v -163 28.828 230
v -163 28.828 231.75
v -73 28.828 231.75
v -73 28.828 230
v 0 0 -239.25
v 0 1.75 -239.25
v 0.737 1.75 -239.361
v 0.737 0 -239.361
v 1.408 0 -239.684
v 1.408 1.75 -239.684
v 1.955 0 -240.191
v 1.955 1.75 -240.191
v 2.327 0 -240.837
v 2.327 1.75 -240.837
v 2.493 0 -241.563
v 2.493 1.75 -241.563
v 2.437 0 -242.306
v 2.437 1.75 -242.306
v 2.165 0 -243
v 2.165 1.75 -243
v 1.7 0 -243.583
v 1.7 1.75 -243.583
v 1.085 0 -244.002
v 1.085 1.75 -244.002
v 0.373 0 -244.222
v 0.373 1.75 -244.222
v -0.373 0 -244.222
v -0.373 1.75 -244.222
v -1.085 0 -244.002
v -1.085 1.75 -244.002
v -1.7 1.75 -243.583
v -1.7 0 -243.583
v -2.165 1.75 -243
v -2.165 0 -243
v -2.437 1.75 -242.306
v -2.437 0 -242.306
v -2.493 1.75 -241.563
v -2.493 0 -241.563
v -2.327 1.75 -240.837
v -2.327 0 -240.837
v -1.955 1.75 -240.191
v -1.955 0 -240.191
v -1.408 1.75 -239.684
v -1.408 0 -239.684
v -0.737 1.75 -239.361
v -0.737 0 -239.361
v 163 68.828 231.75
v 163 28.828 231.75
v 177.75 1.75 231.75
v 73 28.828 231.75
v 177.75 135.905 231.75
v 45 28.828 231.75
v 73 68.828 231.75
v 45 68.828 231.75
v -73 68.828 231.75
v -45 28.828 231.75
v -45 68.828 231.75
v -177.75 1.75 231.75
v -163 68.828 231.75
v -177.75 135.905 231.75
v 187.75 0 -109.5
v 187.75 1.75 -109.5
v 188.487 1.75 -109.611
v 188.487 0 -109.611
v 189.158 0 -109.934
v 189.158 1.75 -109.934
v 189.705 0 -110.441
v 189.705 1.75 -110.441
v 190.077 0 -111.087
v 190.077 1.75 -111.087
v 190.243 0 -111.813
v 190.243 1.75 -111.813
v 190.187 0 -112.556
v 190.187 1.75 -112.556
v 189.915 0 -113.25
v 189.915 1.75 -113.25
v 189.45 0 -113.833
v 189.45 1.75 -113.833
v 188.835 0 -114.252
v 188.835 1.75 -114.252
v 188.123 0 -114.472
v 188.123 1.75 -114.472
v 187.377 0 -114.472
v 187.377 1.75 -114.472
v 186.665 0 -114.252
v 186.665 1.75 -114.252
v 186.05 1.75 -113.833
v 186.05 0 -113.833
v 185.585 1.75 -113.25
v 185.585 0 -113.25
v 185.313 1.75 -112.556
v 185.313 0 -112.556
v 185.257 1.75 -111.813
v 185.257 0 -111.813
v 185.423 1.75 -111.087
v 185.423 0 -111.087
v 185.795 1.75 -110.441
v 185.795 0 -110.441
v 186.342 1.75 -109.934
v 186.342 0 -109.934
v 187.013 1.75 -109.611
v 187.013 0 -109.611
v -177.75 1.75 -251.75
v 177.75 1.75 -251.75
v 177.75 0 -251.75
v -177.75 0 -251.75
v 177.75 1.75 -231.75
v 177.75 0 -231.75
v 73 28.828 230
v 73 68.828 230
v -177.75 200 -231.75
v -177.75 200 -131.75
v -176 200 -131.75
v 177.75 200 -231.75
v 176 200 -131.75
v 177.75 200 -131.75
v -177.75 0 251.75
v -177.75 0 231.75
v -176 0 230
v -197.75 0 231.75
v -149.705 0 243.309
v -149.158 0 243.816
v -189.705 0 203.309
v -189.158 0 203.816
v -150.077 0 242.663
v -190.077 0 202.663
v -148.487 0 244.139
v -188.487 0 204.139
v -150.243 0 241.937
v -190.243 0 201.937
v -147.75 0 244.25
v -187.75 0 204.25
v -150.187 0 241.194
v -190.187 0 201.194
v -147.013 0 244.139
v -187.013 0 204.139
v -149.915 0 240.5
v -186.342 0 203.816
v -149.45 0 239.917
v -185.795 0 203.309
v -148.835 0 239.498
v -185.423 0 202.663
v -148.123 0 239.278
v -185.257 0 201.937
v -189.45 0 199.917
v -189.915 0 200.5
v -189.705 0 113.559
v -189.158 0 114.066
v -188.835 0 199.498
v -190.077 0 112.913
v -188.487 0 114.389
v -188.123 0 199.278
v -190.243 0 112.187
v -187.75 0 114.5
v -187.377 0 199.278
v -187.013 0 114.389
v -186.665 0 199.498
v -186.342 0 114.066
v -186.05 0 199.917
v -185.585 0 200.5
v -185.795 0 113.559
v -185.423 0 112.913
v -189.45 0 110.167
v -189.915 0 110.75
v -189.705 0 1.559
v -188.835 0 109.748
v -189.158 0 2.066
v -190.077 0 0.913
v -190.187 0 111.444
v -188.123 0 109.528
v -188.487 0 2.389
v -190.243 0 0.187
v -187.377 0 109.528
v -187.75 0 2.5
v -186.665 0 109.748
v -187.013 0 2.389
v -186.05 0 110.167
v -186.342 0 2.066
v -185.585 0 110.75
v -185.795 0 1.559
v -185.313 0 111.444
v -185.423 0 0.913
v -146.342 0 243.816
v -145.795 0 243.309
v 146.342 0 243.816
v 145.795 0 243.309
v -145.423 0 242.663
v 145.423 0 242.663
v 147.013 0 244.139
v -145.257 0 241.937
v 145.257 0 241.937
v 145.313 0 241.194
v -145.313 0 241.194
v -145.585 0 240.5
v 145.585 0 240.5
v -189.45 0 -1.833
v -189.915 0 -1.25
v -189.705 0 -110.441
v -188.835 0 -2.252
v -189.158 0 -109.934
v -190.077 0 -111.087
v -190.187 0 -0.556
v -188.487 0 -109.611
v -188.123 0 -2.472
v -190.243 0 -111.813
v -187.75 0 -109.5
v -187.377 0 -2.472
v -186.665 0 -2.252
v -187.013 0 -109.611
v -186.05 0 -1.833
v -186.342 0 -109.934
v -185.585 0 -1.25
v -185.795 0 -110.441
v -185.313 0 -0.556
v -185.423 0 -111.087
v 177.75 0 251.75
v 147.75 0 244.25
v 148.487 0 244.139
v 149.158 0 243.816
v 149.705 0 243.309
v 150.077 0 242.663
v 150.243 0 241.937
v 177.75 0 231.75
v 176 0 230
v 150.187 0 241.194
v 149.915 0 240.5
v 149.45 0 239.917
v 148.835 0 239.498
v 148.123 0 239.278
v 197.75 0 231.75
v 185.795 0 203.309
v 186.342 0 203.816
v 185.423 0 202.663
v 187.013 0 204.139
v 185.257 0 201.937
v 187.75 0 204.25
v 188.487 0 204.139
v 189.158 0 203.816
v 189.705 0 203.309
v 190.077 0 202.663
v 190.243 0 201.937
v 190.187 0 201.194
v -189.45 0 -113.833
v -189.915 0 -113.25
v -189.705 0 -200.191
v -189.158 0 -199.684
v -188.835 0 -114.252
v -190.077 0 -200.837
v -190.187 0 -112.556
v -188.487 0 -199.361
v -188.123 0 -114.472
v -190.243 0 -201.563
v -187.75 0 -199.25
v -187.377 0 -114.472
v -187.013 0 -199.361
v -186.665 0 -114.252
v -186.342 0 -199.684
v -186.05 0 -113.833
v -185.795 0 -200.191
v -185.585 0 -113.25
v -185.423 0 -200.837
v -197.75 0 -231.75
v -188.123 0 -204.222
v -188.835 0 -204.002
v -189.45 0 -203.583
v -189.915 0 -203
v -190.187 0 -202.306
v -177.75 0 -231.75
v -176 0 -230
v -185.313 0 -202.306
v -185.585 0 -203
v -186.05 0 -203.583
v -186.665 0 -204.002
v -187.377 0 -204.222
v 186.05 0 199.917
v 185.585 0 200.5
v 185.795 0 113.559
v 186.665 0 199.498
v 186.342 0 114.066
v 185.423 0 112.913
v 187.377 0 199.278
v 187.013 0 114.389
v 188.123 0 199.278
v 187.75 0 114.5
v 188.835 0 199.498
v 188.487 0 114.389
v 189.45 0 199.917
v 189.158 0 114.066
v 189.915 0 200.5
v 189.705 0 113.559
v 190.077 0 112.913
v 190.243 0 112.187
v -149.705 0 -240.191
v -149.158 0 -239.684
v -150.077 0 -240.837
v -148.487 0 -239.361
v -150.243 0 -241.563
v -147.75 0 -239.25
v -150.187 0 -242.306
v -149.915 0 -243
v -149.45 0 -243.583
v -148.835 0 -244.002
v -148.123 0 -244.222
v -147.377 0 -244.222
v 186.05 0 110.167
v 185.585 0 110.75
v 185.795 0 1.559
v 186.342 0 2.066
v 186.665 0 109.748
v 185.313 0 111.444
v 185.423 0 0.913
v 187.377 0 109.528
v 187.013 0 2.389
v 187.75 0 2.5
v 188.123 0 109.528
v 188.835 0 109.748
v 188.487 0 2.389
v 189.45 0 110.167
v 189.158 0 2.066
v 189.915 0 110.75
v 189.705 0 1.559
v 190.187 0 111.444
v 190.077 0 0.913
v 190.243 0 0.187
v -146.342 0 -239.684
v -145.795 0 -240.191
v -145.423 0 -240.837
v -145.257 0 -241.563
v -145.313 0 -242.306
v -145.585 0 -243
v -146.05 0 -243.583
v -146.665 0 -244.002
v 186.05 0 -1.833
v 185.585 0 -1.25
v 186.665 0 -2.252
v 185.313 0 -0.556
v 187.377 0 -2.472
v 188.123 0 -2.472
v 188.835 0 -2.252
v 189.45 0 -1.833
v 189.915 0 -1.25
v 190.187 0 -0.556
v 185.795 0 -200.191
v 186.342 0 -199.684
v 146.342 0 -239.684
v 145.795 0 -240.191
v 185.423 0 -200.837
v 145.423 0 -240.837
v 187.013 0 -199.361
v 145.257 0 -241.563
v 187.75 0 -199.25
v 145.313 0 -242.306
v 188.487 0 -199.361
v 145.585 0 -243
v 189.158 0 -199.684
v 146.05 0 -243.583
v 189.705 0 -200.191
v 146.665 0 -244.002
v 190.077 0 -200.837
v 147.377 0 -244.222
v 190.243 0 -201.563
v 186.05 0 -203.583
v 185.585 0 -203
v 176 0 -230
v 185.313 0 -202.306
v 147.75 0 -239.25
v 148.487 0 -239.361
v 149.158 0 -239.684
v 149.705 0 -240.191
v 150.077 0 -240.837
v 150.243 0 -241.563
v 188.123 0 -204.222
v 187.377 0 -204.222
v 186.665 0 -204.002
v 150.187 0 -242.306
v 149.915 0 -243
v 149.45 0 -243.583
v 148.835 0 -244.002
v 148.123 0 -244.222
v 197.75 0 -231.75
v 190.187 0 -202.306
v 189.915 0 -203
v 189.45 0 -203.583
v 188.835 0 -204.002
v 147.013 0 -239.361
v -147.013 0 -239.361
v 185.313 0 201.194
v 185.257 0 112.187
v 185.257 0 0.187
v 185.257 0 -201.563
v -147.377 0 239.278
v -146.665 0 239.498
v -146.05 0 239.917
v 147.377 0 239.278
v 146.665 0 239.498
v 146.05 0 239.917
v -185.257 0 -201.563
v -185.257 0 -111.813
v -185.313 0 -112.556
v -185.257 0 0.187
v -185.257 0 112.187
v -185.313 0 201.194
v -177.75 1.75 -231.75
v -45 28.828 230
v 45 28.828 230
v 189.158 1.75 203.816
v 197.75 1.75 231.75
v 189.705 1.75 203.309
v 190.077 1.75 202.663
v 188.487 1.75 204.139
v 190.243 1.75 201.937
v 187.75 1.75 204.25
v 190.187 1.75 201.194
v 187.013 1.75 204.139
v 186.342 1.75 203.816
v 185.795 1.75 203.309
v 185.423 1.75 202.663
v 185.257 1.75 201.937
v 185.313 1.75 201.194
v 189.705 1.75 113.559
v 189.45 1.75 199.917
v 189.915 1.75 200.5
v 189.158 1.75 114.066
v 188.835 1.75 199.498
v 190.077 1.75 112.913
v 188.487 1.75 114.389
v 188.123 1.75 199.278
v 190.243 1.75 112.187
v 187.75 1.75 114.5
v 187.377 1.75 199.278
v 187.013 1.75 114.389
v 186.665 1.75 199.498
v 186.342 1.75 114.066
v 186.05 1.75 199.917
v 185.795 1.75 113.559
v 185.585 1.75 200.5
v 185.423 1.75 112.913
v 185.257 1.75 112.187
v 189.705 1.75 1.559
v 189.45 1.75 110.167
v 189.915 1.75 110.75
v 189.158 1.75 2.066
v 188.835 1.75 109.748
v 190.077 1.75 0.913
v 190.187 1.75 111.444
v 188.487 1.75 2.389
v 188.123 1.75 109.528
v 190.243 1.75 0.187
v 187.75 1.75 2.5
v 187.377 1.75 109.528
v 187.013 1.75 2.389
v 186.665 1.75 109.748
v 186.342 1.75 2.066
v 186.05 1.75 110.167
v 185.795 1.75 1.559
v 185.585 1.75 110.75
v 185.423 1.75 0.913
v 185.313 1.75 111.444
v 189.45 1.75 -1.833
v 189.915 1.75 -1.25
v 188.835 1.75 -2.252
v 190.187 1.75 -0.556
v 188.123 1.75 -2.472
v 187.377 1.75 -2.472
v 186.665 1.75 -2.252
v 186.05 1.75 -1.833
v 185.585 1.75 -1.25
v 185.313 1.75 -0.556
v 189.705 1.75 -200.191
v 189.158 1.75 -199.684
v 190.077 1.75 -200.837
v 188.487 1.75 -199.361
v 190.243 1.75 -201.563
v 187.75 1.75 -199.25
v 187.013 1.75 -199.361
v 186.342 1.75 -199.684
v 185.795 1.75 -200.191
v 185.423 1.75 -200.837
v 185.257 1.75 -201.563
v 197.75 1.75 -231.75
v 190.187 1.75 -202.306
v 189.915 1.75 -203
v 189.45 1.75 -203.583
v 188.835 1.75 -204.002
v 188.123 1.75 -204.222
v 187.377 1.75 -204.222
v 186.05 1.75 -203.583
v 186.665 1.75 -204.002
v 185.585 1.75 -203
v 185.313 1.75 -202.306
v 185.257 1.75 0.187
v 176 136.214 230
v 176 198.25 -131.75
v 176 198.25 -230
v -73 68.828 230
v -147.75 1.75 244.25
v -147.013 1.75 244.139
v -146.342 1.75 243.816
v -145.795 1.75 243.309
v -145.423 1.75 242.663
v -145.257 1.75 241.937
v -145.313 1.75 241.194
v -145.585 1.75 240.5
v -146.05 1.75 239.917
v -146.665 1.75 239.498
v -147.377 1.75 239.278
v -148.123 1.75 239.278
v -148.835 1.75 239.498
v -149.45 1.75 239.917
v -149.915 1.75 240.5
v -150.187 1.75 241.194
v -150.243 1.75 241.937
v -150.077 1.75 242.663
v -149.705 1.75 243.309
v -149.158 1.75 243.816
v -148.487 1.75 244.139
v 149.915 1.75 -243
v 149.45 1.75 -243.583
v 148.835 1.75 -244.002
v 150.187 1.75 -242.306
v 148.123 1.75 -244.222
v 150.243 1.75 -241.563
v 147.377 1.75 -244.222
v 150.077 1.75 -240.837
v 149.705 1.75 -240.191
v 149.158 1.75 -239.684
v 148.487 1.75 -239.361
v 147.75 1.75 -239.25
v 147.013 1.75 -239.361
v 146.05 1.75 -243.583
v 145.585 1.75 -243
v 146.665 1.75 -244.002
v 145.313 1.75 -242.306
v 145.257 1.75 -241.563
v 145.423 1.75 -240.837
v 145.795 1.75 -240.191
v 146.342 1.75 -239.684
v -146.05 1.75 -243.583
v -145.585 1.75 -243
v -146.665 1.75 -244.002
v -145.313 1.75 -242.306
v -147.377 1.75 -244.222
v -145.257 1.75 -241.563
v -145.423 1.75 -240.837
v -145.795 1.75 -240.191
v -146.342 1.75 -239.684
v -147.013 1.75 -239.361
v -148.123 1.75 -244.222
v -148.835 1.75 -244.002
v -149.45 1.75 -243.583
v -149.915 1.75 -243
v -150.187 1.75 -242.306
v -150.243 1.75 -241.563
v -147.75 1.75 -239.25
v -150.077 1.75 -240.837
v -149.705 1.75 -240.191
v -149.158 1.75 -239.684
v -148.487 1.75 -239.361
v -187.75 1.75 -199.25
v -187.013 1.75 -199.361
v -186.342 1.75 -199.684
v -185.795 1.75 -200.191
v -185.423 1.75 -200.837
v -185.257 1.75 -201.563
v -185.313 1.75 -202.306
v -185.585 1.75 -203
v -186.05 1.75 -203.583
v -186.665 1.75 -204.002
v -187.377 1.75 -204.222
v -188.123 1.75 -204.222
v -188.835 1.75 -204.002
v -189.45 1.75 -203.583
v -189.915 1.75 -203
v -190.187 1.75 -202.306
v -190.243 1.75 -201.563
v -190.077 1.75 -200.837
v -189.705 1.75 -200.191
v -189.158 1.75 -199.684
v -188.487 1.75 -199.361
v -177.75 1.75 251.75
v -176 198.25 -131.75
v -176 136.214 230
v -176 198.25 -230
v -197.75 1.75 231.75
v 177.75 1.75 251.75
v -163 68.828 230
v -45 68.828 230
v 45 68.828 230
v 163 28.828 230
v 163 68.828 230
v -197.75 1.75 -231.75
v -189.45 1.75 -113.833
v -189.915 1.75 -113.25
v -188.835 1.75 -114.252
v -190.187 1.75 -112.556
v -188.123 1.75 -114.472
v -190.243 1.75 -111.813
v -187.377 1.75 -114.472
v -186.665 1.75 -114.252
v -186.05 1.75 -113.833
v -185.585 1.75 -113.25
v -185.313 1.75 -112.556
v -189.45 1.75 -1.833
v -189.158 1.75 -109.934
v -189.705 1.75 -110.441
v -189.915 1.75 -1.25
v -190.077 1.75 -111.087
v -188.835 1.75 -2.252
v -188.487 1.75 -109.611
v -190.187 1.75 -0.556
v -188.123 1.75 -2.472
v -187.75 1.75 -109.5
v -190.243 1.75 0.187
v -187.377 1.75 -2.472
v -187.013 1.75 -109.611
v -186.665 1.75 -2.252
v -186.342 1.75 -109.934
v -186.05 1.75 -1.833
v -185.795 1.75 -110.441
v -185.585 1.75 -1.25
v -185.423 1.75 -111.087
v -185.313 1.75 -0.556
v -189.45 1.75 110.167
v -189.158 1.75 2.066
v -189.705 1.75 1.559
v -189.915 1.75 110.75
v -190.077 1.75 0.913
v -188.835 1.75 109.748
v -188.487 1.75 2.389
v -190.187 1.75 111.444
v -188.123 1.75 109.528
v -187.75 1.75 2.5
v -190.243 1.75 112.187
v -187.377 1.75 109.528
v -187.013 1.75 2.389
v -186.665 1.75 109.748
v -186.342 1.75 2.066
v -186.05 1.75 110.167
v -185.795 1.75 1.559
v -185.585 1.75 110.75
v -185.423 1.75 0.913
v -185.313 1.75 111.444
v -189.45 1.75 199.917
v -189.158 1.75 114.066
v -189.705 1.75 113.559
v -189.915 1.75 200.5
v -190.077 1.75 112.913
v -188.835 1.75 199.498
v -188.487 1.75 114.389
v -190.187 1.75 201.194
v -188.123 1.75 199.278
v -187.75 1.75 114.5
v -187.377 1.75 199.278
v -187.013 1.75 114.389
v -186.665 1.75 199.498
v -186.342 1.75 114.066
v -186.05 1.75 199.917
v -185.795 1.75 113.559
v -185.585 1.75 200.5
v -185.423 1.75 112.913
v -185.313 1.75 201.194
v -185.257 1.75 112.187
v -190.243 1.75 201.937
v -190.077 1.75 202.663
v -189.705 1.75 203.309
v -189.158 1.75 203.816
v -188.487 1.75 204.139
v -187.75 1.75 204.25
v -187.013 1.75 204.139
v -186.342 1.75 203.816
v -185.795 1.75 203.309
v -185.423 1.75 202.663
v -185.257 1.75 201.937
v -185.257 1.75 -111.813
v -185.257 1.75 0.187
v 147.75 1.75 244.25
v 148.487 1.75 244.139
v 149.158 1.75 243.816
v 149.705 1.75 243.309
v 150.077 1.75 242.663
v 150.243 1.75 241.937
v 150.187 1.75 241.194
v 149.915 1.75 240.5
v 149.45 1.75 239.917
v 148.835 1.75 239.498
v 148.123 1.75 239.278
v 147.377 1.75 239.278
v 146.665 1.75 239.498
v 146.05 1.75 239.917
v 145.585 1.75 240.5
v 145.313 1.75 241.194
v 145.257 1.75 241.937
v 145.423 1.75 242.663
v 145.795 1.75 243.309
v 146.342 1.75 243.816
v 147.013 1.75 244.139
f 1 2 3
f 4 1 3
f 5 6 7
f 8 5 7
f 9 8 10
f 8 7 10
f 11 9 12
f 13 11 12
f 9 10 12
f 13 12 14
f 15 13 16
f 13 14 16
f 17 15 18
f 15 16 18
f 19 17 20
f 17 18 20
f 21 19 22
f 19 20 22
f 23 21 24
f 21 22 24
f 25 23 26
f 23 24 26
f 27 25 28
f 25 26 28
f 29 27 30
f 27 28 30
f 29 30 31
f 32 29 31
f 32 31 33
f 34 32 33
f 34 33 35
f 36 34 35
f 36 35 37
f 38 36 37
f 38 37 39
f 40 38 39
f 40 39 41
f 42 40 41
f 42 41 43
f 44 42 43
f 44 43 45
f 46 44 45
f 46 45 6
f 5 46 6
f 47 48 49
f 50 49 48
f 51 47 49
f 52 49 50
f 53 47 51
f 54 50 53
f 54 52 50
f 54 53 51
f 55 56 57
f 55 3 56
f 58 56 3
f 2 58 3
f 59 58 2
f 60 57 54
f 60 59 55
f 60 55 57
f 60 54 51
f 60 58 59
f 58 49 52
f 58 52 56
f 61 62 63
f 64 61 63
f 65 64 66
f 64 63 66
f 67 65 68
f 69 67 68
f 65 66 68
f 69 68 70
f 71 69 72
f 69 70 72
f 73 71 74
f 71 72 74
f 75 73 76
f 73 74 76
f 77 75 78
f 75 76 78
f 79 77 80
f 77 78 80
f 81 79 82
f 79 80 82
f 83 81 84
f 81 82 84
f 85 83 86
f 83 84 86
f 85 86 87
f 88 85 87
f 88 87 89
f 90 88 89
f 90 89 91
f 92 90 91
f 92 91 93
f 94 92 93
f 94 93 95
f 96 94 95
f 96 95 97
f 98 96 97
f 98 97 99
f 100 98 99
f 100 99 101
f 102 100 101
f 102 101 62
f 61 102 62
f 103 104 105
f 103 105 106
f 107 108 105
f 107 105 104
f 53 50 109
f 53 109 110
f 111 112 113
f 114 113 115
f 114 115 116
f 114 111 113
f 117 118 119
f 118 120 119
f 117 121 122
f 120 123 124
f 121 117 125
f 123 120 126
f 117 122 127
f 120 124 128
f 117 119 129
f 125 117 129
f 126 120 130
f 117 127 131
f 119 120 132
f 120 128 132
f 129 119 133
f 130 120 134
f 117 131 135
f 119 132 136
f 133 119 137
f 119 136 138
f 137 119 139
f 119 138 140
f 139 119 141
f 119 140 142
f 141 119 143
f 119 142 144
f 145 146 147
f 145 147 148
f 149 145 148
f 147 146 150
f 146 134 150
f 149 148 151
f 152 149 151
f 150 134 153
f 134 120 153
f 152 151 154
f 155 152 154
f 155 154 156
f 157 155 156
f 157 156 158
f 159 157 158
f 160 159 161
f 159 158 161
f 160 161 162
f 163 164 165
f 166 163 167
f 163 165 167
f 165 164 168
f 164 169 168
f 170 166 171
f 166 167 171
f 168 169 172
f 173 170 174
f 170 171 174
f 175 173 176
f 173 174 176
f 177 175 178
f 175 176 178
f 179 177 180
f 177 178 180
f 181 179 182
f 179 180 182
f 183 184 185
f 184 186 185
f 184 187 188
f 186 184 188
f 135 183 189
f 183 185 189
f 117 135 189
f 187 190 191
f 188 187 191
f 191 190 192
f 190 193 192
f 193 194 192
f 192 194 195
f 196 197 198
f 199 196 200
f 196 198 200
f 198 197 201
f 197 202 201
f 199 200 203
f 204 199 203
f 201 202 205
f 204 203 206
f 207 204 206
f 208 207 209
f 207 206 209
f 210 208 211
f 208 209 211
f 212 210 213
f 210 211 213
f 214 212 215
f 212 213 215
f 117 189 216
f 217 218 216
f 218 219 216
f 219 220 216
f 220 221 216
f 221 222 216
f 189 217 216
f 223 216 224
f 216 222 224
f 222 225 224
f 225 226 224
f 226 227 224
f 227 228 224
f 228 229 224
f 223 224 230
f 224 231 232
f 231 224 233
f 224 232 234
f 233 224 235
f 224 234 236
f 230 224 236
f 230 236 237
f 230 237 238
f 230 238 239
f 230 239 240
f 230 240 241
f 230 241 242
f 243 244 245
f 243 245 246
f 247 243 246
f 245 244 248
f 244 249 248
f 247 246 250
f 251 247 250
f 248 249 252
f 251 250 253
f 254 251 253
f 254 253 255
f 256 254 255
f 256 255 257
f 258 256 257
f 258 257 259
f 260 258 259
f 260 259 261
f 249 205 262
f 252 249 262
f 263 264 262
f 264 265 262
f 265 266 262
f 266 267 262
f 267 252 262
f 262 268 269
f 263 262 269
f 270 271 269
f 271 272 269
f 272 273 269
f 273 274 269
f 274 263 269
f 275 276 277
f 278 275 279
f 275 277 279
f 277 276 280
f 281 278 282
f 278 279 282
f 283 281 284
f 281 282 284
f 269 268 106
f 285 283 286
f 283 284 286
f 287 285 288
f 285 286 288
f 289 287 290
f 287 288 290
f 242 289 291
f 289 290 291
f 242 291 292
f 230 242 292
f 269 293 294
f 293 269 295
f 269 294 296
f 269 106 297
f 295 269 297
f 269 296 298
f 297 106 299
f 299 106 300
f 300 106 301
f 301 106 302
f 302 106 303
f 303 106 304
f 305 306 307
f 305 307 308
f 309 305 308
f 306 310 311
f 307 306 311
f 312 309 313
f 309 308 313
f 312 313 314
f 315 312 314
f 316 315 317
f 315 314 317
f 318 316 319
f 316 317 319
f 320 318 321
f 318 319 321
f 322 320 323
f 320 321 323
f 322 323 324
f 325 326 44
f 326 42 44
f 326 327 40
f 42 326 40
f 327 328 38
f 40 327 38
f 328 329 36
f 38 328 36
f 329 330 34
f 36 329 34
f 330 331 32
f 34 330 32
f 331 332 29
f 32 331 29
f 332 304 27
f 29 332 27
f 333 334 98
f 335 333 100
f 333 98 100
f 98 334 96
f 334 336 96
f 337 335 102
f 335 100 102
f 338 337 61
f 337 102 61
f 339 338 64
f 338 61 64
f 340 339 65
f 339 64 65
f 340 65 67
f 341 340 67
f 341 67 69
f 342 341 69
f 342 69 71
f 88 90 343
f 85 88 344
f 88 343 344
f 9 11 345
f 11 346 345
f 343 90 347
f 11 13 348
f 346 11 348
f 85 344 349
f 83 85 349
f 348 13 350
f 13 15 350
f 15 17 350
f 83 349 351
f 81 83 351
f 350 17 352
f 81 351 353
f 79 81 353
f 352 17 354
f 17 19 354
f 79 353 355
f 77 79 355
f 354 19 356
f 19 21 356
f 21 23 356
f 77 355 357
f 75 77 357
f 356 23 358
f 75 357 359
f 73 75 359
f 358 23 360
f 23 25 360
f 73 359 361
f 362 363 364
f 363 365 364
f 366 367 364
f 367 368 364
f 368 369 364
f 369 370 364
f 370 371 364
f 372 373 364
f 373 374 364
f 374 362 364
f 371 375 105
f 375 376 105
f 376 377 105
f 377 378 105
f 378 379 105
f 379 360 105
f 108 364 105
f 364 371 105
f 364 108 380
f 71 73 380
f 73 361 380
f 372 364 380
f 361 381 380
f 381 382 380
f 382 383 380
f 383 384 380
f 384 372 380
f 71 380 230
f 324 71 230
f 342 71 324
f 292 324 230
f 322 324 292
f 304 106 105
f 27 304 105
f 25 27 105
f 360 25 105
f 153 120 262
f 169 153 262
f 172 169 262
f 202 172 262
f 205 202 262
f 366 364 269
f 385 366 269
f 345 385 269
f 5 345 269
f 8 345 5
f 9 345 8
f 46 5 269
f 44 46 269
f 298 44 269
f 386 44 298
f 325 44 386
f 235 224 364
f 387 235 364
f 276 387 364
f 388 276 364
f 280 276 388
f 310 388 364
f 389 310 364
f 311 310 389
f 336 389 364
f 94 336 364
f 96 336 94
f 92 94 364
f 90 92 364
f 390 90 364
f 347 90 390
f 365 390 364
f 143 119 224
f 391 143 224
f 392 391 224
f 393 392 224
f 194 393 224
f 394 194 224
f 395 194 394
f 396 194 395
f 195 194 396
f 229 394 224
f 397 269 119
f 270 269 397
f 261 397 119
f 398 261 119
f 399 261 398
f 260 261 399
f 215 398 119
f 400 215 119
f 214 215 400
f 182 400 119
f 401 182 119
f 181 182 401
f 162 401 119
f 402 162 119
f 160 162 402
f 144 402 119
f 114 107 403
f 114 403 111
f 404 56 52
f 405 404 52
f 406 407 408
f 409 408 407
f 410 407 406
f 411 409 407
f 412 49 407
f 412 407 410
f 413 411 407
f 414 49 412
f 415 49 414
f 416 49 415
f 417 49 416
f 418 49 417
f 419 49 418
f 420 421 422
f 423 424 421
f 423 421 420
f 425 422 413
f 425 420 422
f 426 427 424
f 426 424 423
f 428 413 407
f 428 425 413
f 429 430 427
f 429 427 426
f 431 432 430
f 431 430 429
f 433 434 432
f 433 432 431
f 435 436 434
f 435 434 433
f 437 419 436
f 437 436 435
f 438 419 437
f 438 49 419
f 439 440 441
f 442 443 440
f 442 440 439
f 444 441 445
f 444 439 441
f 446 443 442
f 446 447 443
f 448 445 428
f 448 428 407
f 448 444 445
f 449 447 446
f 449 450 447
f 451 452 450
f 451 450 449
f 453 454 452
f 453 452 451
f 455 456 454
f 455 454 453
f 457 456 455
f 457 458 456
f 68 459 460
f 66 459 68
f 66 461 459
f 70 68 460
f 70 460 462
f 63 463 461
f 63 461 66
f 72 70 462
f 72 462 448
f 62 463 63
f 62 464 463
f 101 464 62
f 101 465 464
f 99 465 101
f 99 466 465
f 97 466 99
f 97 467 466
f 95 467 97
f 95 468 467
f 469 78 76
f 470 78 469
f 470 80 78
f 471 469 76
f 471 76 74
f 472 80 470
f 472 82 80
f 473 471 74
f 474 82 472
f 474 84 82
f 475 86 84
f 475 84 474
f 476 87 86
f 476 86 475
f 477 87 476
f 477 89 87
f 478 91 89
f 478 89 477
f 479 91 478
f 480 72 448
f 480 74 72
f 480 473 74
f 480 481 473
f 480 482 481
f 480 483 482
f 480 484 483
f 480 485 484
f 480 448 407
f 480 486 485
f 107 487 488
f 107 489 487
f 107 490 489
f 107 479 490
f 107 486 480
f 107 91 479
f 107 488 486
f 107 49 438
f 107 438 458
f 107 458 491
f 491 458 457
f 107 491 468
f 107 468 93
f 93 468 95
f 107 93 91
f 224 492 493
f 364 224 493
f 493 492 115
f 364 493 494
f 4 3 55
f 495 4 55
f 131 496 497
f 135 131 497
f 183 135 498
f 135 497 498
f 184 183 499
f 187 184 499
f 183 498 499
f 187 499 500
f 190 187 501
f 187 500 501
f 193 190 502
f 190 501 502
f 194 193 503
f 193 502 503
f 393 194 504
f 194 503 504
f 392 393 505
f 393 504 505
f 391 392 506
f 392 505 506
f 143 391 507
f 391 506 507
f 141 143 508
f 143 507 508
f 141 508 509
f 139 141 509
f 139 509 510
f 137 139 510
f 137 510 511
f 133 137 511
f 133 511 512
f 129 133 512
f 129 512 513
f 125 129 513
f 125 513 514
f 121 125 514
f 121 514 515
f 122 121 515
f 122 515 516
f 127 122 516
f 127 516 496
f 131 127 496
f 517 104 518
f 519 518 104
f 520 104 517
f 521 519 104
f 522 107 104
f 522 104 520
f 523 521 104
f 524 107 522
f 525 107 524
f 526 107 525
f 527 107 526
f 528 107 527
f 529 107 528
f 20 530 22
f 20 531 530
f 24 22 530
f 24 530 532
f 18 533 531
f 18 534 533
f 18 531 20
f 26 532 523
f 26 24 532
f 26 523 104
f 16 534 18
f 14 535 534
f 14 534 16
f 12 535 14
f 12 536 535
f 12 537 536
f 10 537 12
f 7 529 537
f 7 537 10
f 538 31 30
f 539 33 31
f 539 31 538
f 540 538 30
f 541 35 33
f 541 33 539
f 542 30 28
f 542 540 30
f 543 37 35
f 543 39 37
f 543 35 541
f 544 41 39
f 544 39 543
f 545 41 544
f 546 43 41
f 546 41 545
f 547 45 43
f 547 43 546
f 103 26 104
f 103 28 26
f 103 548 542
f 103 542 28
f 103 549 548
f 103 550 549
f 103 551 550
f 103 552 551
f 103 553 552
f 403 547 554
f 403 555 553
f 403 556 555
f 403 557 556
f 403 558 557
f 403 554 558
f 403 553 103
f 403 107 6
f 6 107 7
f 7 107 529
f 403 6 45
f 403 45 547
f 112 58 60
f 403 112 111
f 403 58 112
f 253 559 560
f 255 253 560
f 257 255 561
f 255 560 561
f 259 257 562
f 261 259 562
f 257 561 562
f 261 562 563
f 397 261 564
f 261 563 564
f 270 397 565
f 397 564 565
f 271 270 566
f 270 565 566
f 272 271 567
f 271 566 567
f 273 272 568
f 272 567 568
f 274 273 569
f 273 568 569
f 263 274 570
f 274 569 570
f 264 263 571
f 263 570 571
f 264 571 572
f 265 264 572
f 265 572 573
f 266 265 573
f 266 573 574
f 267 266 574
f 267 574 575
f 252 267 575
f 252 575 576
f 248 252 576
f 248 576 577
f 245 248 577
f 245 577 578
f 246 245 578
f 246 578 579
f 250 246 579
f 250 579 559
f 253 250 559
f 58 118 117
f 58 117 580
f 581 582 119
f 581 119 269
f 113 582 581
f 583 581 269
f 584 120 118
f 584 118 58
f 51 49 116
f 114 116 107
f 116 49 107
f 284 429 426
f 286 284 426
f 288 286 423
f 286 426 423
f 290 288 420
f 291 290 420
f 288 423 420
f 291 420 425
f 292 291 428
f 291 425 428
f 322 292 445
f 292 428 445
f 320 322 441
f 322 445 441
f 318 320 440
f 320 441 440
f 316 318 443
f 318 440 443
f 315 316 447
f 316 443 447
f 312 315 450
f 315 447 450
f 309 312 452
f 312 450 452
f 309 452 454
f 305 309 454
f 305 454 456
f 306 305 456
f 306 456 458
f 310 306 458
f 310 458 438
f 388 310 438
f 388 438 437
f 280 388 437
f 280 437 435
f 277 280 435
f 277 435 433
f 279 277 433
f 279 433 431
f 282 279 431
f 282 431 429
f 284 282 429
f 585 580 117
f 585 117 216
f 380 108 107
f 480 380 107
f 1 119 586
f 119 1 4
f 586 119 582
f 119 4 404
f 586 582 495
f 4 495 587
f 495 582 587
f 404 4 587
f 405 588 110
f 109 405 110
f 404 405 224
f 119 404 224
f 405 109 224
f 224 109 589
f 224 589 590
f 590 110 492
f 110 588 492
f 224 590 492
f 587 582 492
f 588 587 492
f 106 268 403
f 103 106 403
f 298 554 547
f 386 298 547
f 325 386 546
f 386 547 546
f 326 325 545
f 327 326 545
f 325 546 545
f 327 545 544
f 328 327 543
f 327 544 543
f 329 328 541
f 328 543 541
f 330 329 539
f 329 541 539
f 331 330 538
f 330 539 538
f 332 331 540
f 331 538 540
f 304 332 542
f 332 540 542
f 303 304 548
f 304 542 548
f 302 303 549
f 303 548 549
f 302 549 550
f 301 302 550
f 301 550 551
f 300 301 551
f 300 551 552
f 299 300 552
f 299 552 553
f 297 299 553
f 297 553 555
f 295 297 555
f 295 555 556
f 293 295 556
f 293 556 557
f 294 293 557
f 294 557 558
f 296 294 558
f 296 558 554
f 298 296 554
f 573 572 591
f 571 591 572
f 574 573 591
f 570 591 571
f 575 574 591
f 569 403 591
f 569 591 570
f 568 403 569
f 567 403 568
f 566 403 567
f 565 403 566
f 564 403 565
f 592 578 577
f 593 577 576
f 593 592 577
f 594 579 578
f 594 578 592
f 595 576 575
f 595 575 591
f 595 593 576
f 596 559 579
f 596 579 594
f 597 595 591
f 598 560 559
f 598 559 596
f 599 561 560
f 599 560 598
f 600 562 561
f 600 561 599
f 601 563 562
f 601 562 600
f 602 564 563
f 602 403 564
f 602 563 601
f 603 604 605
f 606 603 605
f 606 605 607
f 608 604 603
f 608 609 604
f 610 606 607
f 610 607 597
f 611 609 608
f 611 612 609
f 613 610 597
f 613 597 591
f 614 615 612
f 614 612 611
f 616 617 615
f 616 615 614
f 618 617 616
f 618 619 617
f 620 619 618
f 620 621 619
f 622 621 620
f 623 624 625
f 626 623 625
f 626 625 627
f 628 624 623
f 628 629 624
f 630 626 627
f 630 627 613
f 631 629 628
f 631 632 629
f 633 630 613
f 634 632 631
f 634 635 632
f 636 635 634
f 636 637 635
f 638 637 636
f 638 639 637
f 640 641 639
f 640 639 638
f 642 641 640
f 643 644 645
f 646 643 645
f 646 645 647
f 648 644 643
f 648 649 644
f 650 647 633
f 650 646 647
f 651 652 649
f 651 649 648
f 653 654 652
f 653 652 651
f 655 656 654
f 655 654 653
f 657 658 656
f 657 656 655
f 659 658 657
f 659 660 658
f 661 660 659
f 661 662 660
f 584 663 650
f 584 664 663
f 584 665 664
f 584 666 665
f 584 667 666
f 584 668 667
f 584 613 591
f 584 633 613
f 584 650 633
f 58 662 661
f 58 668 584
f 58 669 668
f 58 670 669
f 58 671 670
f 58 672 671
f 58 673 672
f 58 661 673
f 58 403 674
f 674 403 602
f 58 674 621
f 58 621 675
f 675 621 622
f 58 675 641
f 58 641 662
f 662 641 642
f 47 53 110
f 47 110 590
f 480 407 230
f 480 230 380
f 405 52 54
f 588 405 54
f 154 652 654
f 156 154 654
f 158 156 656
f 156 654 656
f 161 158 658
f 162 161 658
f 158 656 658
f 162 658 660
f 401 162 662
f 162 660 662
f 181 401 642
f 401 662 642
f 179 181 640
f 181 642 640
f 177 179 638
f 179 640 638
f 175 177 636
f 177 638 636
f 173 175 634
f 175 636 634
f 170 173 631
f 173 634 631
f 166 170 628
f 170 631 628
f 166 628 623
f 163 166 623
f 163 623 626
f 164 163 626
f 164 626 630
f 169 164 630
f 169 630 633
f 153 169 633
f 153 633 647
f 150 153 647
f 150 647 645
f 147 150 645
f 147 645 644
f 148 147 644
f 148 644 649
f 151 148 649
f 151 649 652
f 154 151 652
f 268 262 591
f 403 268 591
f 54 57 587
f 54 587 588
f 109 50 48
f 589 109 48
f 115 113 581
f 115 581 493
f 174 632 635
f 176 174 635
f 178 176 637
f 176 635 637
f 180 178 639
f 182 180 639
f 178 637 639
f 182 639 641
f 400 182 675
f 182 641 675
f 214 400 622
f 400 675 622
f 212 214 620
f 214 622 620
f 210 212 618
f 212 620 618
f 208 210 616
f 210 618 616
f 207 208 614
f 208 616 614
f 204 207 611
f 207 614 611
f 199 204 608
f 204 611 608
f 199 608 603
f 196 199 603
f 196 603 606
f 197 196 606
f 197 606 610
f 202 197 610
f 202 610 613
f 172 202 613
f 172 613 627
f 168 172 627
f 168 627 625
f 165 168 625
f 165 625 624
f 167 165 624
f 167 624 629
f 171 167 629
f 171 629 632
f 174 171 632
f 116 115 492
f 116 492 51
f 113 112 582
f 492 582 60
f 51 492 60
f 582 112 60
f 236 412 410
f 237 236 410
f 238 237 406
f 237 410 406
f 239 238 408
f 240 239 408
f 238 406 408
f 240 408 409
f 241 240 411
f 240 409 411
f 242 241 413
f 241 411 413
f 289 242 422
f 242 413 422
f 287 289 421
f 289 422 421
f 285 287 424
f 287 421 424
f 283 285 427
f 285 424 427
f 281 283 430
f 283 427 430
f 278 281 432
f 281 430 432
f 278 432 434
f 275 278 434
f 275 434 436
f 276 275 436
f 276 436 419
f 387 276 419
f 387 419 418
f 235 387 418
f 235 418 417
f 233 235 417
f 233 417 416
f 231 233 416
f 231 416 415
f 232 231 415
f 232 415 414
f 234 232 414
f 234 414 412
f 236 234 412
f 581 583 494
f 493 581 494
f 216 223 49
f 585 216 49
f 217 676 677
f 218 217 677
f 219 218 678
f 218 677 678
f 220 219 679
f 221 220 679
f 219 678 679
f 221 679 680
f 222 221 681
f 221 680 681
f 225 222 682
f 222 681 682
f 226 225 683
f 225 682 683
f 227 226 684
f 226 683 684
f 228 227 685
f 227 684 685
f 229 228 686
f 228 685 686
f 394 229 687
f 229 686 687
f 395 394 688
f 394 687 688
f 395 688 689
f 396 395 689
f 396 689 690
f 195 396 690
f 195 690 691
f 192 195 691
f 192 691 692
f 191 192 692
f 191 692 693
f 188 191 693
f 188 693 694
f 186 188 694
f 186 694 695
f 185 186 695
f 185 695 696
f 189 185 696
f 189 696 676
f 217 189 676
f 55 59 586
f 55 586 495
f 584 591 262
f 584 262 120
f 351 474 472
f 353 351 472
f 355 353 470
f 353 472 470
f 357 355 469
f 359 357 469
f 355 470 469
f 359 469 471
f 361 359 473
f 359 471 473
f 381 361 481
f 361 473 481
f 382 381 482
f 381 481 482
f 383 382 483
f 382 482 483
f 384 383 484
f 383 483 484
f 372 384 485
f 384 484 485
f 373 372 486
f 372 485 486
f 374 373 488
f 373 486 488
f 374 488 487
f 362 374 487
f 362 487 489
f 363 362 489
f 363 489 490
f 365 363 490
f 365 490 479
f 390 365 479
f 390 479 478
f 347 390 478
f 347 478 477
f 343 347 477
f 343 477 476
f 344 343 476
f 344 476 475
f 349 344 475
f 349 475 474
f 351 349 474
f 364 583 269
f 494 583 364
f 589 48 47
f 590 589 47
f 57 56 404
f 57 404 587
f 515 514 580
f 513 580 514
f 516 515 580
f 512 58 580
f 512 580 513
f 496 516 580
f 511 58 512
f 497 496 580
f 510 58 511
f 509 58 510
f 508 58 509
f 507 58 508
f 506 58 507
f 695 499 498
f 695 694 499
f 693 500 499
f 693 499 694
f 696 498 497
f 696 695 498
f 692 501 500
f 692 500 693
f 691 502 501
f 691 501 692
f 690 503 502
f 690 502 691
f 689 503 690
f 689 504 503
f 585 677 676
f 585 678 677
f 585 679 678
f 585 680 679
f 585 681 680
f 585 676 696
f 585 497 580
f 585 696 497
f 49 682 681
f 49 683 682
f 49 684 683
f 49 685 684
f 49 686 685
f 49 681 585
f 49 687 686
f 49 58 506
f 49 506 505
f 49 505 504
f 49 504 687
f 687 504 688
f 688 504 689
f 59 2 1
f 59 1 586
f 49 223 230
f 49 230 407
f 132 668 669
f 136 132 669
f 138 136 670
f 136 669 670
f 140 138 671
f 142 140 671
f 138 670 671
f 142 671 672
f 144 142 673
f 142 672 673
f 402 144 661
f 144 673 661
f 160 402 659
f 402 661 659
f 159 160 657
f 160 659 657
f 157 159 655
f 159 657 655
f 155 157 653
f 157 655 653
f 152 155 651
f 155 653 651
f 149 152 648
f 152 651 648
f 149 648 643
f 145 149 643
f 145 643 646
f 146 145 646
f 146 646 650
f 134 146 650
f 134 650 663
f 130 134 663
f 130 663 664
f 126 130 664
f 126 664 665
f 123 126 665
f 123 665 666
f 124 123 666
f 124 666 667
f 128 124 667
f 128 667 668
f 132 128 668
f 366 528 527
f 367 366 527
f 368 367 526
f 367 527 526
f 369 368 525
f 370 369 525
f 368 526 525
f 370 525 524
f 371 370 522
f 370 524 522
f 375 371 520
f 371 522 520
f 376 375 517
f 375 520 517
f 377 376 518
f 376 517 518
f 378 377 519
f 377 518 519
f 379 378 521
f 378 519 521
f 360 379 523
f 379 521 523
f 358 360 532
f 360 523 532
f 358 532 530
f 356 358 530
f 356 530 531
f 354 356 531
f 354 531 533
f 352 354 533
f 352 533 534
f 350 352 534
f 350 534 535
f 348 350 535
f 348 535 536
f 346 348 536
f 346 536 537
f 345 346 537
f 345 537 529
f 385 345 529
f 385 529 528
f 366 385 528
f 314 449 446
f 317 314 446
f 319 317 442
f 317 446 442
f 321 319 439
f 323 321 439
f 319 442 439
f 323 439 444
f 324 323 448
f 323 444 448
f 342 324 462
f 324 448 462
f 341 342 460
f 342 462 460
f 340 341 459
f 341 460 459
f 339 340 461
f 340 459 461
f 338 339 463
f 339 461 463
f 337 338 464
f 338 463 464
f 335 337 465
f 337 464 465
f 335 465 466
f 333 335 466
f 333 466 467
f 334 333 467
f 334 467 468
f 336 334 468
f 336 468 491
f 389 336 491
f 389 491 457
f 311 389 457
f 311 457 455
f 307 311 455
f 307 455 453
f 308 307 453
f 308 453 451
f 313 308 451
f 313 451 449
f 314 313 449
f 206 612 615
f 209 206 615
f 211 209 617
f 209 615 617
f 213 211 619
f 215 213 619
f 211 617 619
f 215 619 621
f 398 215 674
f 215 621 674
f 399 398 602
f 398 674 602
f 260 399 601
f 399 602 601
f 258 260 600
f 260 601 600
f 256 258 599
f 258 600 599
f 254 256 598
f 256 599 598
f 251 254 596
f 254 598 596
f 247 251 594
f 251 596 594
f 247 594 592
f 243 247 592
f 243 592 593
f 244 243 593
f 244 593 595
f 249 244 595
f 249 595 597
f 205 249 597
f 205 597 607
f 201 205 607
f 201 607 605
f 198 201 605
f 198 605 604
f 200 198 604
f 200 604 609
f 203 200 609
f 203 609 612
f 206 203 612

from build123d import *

# Parameters (mm, degrees)
CROQUIS1_W              = 355.5
CROQUIS1_H              = 463.5
SALIENTE_EXTRUIR1_DEPTH = 200
CROQUIS2_W              = 352
CROQUIS2_H              = 460
CORTAR_EXTRUIR1_DEPTH   = 300
CORTAR_EXTRUIR2_DEPTH   = 470.135707978
CROQUIS4_W              = 463.5
CROQUIS4_H              = 1.75
SALIENTE_EXTRUIR2_DEPTH = 20
CROQUIS5_W              = 463.5
CROQUIS5_H              = 1.75
SALIENTE_EXTRUIR3_DEPTH = 20
CROQUIS6_W              = 355.5
CROQUIS6_H              = 1.75
SALIENTE_EXTRUIR4_DEPTH = 20
CROQUIS7_W              = 355.5
CROQUIS7_H              = 1.75
SALIENTE_EXTRUIR5_DEPTH = 20
CROQUIS8_R              = 2.5
CORTAR_EXTRUIR3_DEPTH   = 20
CROQUIS9_W              = 90
CROQUIS9_H              = 40
CORTAR_EXTRUIR4_DEPTH   = 20
CROQUIS10_W             = 352
CROQUIS10_H             = 1.75
SALIENTE_EXTRUIR6_DEPTH = 98.25


with BuildPart() as part:
    # Croquis1 → Saliente-Extruir1 (new body)
    with BuildSketch(Plane(origin=(0, 0, 0), x_dir=(1, 0, 0), z_dir=(0, 1, 0))):
        Rectangle(CROQUIS1_W, CROQUIS1_H)
    extrude(amount=SALIENTE_EXTRUIR1_DEPTH)

    # Croquis2 → Cortar-Extruir1 (cut)
    with BuildSketch(Plane(origin=(0, 200, 0), x_dir=(1, 0, 0), z_dir=(0, 1, 0))):
        Rectangle(CROQUIS2_W, CROQUIS2_H)
    extrude(amount=-CORTAR_EXTRUIR1_DEPTH, mode=Mode.SUBTRACT)

    # Croquis3 → Cortar-Extruir2 (cut, through all)
    with BuildSketch(Plane.ZY.offset(177.75)):
        Polygon((-131.75, 200), (231.75, 135.905142512), (231.75, 200), align=None)
    extrude(amount=-CORTAR_EXTRUIR2_DEPTH, mode=Mode.SUBTRACT)

    # Croquis4 → Saliente-Extruir2 (add)
    with BuildSketch(Plane.ZY.offset(177.75)):
        with Locations((0, 0.875)):
            Rectangle(CROQUIS4_W, CROQUIS4_H)
    extrude(amount=SALIENTE_EXTRUIR2_DEPTH)

    # Croquis5 → Saliente-Extruir3 (add)
    with BuildSketch(Plane(origin=(177.75, 0, 0), x_dir=(0, 0, -1), z_dir=(1, 0, 0))):
        with Locations((0, 0.875)):
            Rectangle(CROQUIS5_W, CROQUIS5_H)
    extrude(amount=SALIENTE_EXTRUIR3_DEPTH)

    # Croquis6 → Saliente-Extruir4 (add)
    with BuildSketch(Plane(origin=(0, 0, -231.75), x_dir=(-1, 0, 0), z_dir=(0, 0, -1))):
        with Locations((0, 0.875)):
            Rectangle(CROQUIS6_W, CROQUIS6_H)
    extrude(amount=SALIENTE_EXTRUIR4_DEPTH)

    # Croquis7 → Saliente-Extruir5 (add)
    with BuildSketch(Plane.XY.offset(231.75)):
        with Locations((0, 0.875)):
            Rectangle(CROQUIS7_W, CROQUIS7_H)
    extrude(amount=SALIENTE_EXTRUIR5_DEPTH)

    # Croquis8 → Cortar-Extruir3 (cut)
    with BuildSketch(Plane(origin=(0, 1.75, 0), x_dir=(1, 0, 0), z_dir=(0, 1, 0))):
        with Locations(Location((-187.75, 201.75, 0), (0, 0, 270))):
            Circle(CROQUIS8_R)
        with Locations(Location((-187.75, 0, 0), (0, 0, 270))):
            Circle(CROQUIS8_R)
        with Locations(Location((-187.75, 112, 0), (0, 0, 270))):
            Circle(CROQUIS8_R)
        with Locations(Location((187.75, 201.75, 0), (0, 0, 270))):
            Circle(CROQUIS8_R)
        with Locations(Location((187.75, 112, 0), (0, 0, 270))):
            Circle(CROQUIS8_R)
        with Locations(Location((187.75, 0, 0), (0, 0, 270))):
            Circle(CROQUIS8_R)
        with Locations(Location((-187.75, -201.75, 0), (0, 0, 270))):
            Circle(CROQUIS8_R)
        with Locations(Location((-187.75, -112, 0), (0, 0, 270))):
            Circle(CROQUIS8_R)
        with Locations(Location((187.75, -112, 0), (0, 0, 270))):
            Circle(CROQUIS8_R)
        with Locations(Location((187.75, -201.75, 0), (0, 0, 270))):
            Circle(CROQUIS8_R)
        with Locations(Location((0, 241.75, 0), (0, 0, 270))):
            Circle(CROQUIS8_R)
        with Locations(Location((147.75, 241.75, 0), (0, 0, 270))):
            Circle(CROQUIS8_R)
        with Locations(Location((-147.75, 241.75, 0), (0, 0, 270))):
            Circle(CROQUIS8_R)
        with Locations(Location((147.75, -241.75, 0), (0, 0, 270))):
            Circle(CROQUIS8_R)
        with Locations(Location((-147.75, -241.75, 0), (0, 0, 270))):
            Circle(CROQUIS8_R)
    extrude(amount=-CORTAR_EXTRUIR3_DEPTH, mode=Mode.SUBTRACT)

    # Croquis9 → Cortar-Extruir4 (cut)
    with BuildSketch(Plane.XY.offset(231.75)):
        with Locations((118, 48.827571256)):
            Rectangle(CROQUIS9_W, CROQUIS9_H)
        with Locations((0, 48.827571256)):
            Rectangle(CROQUIS9_W, CROQUIS9_H)
        with Locations((-118, 48.827571256)):
            Rectangle(CROQUIS9_W, CROQUIS9_H)
    extrude(amount=-CORTAR_EXTRUIR4_DEPTH, mode=Mode.SUBTRACT)

    # Croquis10 → Saliente-Extruir6 (add)
    with BuildSketch(Plane.XY.offset(-230)):
        with Locations((0, 199.125)):
            Rectangle(CROQUIS10_W, CROQUIS10_H)
    extrude(amount=SALIENTE_EXTRUIR6_DEPTH)


solid = part.part
